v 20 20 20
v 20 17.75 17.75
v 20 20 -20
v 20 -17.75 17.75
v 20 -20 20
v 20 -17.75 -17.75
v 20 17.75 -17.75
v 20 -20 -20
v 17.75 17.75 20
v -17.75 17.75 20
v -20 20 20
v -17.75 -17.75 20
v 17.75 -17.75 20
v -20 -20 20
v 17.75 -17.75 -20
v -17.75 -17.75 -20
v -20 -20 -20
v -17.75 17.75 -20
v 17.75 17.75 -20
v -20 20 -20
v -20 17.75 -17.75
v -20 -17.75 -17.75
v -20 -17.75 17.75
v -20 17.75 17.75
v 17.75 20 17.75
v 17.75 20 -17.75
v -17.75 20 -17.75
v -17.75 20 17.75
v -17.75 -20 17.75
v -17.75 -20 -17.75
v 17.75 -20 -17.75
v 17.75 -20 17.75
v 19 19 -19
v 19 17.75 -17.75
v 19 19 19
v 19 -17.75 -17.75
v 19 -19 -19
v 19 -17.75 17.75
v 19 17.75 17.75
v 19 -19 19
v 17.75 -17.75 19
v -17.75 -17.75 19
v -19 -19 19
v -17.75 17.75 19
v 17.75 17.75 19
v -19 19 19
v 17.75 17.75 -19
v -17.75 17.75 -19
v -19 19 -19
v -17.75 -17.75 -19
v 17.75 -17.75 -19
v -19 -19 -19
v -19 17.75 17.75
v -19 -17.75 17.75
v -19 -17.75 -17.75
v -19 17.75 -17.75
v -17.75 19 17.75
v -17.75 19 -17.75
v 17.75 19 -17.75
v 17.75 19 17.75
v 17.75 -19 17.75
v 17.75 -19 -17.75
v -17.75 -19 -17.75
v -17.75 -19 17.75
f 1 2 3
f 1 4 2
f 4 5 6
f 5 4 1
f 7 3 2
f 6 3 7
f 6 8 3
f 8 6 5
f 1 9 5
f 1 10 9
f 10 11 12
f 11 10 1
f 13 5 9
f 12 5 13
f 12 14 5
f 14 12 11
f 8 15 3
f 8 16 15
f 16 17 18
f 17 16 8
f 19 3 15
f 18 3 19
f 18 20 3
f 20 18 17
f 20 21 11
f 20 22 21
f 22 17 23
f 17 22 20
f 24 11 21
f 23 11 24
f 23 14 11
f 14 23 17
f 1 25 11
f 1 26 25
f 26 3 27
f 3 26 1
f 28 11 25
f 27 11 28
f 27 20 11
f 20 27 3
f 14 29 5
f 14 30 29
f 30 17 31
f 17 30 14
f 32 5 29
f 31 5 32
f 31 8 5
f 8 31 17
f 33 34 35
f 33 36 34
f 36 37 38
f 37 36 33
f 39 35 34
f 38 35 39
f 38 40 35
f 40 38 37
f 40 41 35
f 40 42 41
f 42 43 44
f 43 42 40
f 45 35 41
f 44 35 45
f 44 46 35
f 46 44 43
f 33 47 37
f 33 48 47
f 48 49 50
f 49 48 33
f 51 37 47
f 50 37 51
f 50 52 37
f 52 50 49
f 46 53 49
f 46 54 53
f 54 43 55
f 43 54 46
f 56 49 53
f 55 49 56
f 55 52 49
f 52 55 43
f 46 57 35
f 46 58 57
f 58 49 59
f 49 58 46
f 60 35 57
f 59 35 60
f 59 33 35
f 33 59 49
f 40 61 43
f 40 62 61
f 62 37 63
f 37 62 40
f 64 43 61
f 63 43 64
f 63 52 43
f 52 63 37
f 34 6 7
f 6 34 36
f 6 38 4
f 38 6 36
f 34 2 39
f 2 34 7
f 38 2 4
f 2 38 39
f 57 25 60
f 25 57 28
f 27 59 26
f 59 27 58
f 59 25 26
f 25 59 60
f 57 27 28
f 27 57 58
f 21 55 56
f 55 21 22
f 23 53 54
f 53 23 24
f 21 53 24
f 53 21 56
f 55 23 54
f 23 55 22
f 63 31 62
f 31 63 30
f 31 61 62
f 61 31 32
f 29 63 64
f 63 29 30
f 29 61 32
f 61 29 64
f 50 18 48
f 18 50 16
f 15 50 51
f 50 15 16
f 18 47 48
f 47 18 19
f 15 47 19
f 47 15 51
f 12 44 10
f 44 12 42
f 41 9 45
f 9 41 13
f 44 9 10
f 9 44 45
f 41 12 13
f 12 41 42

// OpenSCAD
// file: modules.scad
module noir(filename,text)
{
    rotate([0,0,180])
     difference() 
     {   
        union()
        { 
            translate([5,0,0])  cube([35,35,5],center=true); 
//            translate([22.5,0,0])  cube([2,2,5],center=true); 
        }
        translate([3,0,4.6])    scale([0.14,0.14,-0.03])  surface(file = filename, center = true);
        translate([22.0,-7.2,1.5])   rotate([0,0,90])  linear_extrude(4)  text (text, font="Ubuntu Mono:style=Bold", $fn=50,size= 4);
     } 
}

module blanc (filename,text)
{
    rotate([0,0,180])        
    intersection() 
    {    
        translate([5,0,0])  cube([35,35,5],center=true); 
        union(){ 
                translate([3,0,4.6])    scale([0.14,0.14,-0.03])  surface(file = filename, center = true); 
                translate([22.0,-7.2,1.5])   rotate([0,0,90])  linear_extrude(4)  text (text, font="Ubuntu Mono:style=Bold", $fn=50,size= 4); 
        } 
    } 
}

module shape ()
{
    rotate([0,0,180])   translate([5,0,0])  cube([35.5,35.5,5],center=true); 
//    rotate([0,0,180])   translate([22.5,0,0])  cube([2.5,2.5,5],center=true); 
}
// main file
include <modules.scad>

difference()
{
    cube([40,40,40],center=true);    
    cube([38,38,38],center=true);    
    translate([35/2,0,-5]) rotate([0,90,0])    shape();
    rotate([0,0,90])    translate([35/2,0,-5]) rotate([0,90,0])    shape();
    rotate([0,0,180])    translate([35/2,0,-5]) rotate([0,90,0])    shape();
    rotate([0,0,270])    translate([35/2,0,-5]) rotate([0,90,0])    shape();
    rotate([0,90,0])    translate([35/2,0,-5]) rotate([0,90,0])    shape();
    rotate([0,270,0])    translate([35/2,0,-5]) rotate([0,90,0])    shape();
}
